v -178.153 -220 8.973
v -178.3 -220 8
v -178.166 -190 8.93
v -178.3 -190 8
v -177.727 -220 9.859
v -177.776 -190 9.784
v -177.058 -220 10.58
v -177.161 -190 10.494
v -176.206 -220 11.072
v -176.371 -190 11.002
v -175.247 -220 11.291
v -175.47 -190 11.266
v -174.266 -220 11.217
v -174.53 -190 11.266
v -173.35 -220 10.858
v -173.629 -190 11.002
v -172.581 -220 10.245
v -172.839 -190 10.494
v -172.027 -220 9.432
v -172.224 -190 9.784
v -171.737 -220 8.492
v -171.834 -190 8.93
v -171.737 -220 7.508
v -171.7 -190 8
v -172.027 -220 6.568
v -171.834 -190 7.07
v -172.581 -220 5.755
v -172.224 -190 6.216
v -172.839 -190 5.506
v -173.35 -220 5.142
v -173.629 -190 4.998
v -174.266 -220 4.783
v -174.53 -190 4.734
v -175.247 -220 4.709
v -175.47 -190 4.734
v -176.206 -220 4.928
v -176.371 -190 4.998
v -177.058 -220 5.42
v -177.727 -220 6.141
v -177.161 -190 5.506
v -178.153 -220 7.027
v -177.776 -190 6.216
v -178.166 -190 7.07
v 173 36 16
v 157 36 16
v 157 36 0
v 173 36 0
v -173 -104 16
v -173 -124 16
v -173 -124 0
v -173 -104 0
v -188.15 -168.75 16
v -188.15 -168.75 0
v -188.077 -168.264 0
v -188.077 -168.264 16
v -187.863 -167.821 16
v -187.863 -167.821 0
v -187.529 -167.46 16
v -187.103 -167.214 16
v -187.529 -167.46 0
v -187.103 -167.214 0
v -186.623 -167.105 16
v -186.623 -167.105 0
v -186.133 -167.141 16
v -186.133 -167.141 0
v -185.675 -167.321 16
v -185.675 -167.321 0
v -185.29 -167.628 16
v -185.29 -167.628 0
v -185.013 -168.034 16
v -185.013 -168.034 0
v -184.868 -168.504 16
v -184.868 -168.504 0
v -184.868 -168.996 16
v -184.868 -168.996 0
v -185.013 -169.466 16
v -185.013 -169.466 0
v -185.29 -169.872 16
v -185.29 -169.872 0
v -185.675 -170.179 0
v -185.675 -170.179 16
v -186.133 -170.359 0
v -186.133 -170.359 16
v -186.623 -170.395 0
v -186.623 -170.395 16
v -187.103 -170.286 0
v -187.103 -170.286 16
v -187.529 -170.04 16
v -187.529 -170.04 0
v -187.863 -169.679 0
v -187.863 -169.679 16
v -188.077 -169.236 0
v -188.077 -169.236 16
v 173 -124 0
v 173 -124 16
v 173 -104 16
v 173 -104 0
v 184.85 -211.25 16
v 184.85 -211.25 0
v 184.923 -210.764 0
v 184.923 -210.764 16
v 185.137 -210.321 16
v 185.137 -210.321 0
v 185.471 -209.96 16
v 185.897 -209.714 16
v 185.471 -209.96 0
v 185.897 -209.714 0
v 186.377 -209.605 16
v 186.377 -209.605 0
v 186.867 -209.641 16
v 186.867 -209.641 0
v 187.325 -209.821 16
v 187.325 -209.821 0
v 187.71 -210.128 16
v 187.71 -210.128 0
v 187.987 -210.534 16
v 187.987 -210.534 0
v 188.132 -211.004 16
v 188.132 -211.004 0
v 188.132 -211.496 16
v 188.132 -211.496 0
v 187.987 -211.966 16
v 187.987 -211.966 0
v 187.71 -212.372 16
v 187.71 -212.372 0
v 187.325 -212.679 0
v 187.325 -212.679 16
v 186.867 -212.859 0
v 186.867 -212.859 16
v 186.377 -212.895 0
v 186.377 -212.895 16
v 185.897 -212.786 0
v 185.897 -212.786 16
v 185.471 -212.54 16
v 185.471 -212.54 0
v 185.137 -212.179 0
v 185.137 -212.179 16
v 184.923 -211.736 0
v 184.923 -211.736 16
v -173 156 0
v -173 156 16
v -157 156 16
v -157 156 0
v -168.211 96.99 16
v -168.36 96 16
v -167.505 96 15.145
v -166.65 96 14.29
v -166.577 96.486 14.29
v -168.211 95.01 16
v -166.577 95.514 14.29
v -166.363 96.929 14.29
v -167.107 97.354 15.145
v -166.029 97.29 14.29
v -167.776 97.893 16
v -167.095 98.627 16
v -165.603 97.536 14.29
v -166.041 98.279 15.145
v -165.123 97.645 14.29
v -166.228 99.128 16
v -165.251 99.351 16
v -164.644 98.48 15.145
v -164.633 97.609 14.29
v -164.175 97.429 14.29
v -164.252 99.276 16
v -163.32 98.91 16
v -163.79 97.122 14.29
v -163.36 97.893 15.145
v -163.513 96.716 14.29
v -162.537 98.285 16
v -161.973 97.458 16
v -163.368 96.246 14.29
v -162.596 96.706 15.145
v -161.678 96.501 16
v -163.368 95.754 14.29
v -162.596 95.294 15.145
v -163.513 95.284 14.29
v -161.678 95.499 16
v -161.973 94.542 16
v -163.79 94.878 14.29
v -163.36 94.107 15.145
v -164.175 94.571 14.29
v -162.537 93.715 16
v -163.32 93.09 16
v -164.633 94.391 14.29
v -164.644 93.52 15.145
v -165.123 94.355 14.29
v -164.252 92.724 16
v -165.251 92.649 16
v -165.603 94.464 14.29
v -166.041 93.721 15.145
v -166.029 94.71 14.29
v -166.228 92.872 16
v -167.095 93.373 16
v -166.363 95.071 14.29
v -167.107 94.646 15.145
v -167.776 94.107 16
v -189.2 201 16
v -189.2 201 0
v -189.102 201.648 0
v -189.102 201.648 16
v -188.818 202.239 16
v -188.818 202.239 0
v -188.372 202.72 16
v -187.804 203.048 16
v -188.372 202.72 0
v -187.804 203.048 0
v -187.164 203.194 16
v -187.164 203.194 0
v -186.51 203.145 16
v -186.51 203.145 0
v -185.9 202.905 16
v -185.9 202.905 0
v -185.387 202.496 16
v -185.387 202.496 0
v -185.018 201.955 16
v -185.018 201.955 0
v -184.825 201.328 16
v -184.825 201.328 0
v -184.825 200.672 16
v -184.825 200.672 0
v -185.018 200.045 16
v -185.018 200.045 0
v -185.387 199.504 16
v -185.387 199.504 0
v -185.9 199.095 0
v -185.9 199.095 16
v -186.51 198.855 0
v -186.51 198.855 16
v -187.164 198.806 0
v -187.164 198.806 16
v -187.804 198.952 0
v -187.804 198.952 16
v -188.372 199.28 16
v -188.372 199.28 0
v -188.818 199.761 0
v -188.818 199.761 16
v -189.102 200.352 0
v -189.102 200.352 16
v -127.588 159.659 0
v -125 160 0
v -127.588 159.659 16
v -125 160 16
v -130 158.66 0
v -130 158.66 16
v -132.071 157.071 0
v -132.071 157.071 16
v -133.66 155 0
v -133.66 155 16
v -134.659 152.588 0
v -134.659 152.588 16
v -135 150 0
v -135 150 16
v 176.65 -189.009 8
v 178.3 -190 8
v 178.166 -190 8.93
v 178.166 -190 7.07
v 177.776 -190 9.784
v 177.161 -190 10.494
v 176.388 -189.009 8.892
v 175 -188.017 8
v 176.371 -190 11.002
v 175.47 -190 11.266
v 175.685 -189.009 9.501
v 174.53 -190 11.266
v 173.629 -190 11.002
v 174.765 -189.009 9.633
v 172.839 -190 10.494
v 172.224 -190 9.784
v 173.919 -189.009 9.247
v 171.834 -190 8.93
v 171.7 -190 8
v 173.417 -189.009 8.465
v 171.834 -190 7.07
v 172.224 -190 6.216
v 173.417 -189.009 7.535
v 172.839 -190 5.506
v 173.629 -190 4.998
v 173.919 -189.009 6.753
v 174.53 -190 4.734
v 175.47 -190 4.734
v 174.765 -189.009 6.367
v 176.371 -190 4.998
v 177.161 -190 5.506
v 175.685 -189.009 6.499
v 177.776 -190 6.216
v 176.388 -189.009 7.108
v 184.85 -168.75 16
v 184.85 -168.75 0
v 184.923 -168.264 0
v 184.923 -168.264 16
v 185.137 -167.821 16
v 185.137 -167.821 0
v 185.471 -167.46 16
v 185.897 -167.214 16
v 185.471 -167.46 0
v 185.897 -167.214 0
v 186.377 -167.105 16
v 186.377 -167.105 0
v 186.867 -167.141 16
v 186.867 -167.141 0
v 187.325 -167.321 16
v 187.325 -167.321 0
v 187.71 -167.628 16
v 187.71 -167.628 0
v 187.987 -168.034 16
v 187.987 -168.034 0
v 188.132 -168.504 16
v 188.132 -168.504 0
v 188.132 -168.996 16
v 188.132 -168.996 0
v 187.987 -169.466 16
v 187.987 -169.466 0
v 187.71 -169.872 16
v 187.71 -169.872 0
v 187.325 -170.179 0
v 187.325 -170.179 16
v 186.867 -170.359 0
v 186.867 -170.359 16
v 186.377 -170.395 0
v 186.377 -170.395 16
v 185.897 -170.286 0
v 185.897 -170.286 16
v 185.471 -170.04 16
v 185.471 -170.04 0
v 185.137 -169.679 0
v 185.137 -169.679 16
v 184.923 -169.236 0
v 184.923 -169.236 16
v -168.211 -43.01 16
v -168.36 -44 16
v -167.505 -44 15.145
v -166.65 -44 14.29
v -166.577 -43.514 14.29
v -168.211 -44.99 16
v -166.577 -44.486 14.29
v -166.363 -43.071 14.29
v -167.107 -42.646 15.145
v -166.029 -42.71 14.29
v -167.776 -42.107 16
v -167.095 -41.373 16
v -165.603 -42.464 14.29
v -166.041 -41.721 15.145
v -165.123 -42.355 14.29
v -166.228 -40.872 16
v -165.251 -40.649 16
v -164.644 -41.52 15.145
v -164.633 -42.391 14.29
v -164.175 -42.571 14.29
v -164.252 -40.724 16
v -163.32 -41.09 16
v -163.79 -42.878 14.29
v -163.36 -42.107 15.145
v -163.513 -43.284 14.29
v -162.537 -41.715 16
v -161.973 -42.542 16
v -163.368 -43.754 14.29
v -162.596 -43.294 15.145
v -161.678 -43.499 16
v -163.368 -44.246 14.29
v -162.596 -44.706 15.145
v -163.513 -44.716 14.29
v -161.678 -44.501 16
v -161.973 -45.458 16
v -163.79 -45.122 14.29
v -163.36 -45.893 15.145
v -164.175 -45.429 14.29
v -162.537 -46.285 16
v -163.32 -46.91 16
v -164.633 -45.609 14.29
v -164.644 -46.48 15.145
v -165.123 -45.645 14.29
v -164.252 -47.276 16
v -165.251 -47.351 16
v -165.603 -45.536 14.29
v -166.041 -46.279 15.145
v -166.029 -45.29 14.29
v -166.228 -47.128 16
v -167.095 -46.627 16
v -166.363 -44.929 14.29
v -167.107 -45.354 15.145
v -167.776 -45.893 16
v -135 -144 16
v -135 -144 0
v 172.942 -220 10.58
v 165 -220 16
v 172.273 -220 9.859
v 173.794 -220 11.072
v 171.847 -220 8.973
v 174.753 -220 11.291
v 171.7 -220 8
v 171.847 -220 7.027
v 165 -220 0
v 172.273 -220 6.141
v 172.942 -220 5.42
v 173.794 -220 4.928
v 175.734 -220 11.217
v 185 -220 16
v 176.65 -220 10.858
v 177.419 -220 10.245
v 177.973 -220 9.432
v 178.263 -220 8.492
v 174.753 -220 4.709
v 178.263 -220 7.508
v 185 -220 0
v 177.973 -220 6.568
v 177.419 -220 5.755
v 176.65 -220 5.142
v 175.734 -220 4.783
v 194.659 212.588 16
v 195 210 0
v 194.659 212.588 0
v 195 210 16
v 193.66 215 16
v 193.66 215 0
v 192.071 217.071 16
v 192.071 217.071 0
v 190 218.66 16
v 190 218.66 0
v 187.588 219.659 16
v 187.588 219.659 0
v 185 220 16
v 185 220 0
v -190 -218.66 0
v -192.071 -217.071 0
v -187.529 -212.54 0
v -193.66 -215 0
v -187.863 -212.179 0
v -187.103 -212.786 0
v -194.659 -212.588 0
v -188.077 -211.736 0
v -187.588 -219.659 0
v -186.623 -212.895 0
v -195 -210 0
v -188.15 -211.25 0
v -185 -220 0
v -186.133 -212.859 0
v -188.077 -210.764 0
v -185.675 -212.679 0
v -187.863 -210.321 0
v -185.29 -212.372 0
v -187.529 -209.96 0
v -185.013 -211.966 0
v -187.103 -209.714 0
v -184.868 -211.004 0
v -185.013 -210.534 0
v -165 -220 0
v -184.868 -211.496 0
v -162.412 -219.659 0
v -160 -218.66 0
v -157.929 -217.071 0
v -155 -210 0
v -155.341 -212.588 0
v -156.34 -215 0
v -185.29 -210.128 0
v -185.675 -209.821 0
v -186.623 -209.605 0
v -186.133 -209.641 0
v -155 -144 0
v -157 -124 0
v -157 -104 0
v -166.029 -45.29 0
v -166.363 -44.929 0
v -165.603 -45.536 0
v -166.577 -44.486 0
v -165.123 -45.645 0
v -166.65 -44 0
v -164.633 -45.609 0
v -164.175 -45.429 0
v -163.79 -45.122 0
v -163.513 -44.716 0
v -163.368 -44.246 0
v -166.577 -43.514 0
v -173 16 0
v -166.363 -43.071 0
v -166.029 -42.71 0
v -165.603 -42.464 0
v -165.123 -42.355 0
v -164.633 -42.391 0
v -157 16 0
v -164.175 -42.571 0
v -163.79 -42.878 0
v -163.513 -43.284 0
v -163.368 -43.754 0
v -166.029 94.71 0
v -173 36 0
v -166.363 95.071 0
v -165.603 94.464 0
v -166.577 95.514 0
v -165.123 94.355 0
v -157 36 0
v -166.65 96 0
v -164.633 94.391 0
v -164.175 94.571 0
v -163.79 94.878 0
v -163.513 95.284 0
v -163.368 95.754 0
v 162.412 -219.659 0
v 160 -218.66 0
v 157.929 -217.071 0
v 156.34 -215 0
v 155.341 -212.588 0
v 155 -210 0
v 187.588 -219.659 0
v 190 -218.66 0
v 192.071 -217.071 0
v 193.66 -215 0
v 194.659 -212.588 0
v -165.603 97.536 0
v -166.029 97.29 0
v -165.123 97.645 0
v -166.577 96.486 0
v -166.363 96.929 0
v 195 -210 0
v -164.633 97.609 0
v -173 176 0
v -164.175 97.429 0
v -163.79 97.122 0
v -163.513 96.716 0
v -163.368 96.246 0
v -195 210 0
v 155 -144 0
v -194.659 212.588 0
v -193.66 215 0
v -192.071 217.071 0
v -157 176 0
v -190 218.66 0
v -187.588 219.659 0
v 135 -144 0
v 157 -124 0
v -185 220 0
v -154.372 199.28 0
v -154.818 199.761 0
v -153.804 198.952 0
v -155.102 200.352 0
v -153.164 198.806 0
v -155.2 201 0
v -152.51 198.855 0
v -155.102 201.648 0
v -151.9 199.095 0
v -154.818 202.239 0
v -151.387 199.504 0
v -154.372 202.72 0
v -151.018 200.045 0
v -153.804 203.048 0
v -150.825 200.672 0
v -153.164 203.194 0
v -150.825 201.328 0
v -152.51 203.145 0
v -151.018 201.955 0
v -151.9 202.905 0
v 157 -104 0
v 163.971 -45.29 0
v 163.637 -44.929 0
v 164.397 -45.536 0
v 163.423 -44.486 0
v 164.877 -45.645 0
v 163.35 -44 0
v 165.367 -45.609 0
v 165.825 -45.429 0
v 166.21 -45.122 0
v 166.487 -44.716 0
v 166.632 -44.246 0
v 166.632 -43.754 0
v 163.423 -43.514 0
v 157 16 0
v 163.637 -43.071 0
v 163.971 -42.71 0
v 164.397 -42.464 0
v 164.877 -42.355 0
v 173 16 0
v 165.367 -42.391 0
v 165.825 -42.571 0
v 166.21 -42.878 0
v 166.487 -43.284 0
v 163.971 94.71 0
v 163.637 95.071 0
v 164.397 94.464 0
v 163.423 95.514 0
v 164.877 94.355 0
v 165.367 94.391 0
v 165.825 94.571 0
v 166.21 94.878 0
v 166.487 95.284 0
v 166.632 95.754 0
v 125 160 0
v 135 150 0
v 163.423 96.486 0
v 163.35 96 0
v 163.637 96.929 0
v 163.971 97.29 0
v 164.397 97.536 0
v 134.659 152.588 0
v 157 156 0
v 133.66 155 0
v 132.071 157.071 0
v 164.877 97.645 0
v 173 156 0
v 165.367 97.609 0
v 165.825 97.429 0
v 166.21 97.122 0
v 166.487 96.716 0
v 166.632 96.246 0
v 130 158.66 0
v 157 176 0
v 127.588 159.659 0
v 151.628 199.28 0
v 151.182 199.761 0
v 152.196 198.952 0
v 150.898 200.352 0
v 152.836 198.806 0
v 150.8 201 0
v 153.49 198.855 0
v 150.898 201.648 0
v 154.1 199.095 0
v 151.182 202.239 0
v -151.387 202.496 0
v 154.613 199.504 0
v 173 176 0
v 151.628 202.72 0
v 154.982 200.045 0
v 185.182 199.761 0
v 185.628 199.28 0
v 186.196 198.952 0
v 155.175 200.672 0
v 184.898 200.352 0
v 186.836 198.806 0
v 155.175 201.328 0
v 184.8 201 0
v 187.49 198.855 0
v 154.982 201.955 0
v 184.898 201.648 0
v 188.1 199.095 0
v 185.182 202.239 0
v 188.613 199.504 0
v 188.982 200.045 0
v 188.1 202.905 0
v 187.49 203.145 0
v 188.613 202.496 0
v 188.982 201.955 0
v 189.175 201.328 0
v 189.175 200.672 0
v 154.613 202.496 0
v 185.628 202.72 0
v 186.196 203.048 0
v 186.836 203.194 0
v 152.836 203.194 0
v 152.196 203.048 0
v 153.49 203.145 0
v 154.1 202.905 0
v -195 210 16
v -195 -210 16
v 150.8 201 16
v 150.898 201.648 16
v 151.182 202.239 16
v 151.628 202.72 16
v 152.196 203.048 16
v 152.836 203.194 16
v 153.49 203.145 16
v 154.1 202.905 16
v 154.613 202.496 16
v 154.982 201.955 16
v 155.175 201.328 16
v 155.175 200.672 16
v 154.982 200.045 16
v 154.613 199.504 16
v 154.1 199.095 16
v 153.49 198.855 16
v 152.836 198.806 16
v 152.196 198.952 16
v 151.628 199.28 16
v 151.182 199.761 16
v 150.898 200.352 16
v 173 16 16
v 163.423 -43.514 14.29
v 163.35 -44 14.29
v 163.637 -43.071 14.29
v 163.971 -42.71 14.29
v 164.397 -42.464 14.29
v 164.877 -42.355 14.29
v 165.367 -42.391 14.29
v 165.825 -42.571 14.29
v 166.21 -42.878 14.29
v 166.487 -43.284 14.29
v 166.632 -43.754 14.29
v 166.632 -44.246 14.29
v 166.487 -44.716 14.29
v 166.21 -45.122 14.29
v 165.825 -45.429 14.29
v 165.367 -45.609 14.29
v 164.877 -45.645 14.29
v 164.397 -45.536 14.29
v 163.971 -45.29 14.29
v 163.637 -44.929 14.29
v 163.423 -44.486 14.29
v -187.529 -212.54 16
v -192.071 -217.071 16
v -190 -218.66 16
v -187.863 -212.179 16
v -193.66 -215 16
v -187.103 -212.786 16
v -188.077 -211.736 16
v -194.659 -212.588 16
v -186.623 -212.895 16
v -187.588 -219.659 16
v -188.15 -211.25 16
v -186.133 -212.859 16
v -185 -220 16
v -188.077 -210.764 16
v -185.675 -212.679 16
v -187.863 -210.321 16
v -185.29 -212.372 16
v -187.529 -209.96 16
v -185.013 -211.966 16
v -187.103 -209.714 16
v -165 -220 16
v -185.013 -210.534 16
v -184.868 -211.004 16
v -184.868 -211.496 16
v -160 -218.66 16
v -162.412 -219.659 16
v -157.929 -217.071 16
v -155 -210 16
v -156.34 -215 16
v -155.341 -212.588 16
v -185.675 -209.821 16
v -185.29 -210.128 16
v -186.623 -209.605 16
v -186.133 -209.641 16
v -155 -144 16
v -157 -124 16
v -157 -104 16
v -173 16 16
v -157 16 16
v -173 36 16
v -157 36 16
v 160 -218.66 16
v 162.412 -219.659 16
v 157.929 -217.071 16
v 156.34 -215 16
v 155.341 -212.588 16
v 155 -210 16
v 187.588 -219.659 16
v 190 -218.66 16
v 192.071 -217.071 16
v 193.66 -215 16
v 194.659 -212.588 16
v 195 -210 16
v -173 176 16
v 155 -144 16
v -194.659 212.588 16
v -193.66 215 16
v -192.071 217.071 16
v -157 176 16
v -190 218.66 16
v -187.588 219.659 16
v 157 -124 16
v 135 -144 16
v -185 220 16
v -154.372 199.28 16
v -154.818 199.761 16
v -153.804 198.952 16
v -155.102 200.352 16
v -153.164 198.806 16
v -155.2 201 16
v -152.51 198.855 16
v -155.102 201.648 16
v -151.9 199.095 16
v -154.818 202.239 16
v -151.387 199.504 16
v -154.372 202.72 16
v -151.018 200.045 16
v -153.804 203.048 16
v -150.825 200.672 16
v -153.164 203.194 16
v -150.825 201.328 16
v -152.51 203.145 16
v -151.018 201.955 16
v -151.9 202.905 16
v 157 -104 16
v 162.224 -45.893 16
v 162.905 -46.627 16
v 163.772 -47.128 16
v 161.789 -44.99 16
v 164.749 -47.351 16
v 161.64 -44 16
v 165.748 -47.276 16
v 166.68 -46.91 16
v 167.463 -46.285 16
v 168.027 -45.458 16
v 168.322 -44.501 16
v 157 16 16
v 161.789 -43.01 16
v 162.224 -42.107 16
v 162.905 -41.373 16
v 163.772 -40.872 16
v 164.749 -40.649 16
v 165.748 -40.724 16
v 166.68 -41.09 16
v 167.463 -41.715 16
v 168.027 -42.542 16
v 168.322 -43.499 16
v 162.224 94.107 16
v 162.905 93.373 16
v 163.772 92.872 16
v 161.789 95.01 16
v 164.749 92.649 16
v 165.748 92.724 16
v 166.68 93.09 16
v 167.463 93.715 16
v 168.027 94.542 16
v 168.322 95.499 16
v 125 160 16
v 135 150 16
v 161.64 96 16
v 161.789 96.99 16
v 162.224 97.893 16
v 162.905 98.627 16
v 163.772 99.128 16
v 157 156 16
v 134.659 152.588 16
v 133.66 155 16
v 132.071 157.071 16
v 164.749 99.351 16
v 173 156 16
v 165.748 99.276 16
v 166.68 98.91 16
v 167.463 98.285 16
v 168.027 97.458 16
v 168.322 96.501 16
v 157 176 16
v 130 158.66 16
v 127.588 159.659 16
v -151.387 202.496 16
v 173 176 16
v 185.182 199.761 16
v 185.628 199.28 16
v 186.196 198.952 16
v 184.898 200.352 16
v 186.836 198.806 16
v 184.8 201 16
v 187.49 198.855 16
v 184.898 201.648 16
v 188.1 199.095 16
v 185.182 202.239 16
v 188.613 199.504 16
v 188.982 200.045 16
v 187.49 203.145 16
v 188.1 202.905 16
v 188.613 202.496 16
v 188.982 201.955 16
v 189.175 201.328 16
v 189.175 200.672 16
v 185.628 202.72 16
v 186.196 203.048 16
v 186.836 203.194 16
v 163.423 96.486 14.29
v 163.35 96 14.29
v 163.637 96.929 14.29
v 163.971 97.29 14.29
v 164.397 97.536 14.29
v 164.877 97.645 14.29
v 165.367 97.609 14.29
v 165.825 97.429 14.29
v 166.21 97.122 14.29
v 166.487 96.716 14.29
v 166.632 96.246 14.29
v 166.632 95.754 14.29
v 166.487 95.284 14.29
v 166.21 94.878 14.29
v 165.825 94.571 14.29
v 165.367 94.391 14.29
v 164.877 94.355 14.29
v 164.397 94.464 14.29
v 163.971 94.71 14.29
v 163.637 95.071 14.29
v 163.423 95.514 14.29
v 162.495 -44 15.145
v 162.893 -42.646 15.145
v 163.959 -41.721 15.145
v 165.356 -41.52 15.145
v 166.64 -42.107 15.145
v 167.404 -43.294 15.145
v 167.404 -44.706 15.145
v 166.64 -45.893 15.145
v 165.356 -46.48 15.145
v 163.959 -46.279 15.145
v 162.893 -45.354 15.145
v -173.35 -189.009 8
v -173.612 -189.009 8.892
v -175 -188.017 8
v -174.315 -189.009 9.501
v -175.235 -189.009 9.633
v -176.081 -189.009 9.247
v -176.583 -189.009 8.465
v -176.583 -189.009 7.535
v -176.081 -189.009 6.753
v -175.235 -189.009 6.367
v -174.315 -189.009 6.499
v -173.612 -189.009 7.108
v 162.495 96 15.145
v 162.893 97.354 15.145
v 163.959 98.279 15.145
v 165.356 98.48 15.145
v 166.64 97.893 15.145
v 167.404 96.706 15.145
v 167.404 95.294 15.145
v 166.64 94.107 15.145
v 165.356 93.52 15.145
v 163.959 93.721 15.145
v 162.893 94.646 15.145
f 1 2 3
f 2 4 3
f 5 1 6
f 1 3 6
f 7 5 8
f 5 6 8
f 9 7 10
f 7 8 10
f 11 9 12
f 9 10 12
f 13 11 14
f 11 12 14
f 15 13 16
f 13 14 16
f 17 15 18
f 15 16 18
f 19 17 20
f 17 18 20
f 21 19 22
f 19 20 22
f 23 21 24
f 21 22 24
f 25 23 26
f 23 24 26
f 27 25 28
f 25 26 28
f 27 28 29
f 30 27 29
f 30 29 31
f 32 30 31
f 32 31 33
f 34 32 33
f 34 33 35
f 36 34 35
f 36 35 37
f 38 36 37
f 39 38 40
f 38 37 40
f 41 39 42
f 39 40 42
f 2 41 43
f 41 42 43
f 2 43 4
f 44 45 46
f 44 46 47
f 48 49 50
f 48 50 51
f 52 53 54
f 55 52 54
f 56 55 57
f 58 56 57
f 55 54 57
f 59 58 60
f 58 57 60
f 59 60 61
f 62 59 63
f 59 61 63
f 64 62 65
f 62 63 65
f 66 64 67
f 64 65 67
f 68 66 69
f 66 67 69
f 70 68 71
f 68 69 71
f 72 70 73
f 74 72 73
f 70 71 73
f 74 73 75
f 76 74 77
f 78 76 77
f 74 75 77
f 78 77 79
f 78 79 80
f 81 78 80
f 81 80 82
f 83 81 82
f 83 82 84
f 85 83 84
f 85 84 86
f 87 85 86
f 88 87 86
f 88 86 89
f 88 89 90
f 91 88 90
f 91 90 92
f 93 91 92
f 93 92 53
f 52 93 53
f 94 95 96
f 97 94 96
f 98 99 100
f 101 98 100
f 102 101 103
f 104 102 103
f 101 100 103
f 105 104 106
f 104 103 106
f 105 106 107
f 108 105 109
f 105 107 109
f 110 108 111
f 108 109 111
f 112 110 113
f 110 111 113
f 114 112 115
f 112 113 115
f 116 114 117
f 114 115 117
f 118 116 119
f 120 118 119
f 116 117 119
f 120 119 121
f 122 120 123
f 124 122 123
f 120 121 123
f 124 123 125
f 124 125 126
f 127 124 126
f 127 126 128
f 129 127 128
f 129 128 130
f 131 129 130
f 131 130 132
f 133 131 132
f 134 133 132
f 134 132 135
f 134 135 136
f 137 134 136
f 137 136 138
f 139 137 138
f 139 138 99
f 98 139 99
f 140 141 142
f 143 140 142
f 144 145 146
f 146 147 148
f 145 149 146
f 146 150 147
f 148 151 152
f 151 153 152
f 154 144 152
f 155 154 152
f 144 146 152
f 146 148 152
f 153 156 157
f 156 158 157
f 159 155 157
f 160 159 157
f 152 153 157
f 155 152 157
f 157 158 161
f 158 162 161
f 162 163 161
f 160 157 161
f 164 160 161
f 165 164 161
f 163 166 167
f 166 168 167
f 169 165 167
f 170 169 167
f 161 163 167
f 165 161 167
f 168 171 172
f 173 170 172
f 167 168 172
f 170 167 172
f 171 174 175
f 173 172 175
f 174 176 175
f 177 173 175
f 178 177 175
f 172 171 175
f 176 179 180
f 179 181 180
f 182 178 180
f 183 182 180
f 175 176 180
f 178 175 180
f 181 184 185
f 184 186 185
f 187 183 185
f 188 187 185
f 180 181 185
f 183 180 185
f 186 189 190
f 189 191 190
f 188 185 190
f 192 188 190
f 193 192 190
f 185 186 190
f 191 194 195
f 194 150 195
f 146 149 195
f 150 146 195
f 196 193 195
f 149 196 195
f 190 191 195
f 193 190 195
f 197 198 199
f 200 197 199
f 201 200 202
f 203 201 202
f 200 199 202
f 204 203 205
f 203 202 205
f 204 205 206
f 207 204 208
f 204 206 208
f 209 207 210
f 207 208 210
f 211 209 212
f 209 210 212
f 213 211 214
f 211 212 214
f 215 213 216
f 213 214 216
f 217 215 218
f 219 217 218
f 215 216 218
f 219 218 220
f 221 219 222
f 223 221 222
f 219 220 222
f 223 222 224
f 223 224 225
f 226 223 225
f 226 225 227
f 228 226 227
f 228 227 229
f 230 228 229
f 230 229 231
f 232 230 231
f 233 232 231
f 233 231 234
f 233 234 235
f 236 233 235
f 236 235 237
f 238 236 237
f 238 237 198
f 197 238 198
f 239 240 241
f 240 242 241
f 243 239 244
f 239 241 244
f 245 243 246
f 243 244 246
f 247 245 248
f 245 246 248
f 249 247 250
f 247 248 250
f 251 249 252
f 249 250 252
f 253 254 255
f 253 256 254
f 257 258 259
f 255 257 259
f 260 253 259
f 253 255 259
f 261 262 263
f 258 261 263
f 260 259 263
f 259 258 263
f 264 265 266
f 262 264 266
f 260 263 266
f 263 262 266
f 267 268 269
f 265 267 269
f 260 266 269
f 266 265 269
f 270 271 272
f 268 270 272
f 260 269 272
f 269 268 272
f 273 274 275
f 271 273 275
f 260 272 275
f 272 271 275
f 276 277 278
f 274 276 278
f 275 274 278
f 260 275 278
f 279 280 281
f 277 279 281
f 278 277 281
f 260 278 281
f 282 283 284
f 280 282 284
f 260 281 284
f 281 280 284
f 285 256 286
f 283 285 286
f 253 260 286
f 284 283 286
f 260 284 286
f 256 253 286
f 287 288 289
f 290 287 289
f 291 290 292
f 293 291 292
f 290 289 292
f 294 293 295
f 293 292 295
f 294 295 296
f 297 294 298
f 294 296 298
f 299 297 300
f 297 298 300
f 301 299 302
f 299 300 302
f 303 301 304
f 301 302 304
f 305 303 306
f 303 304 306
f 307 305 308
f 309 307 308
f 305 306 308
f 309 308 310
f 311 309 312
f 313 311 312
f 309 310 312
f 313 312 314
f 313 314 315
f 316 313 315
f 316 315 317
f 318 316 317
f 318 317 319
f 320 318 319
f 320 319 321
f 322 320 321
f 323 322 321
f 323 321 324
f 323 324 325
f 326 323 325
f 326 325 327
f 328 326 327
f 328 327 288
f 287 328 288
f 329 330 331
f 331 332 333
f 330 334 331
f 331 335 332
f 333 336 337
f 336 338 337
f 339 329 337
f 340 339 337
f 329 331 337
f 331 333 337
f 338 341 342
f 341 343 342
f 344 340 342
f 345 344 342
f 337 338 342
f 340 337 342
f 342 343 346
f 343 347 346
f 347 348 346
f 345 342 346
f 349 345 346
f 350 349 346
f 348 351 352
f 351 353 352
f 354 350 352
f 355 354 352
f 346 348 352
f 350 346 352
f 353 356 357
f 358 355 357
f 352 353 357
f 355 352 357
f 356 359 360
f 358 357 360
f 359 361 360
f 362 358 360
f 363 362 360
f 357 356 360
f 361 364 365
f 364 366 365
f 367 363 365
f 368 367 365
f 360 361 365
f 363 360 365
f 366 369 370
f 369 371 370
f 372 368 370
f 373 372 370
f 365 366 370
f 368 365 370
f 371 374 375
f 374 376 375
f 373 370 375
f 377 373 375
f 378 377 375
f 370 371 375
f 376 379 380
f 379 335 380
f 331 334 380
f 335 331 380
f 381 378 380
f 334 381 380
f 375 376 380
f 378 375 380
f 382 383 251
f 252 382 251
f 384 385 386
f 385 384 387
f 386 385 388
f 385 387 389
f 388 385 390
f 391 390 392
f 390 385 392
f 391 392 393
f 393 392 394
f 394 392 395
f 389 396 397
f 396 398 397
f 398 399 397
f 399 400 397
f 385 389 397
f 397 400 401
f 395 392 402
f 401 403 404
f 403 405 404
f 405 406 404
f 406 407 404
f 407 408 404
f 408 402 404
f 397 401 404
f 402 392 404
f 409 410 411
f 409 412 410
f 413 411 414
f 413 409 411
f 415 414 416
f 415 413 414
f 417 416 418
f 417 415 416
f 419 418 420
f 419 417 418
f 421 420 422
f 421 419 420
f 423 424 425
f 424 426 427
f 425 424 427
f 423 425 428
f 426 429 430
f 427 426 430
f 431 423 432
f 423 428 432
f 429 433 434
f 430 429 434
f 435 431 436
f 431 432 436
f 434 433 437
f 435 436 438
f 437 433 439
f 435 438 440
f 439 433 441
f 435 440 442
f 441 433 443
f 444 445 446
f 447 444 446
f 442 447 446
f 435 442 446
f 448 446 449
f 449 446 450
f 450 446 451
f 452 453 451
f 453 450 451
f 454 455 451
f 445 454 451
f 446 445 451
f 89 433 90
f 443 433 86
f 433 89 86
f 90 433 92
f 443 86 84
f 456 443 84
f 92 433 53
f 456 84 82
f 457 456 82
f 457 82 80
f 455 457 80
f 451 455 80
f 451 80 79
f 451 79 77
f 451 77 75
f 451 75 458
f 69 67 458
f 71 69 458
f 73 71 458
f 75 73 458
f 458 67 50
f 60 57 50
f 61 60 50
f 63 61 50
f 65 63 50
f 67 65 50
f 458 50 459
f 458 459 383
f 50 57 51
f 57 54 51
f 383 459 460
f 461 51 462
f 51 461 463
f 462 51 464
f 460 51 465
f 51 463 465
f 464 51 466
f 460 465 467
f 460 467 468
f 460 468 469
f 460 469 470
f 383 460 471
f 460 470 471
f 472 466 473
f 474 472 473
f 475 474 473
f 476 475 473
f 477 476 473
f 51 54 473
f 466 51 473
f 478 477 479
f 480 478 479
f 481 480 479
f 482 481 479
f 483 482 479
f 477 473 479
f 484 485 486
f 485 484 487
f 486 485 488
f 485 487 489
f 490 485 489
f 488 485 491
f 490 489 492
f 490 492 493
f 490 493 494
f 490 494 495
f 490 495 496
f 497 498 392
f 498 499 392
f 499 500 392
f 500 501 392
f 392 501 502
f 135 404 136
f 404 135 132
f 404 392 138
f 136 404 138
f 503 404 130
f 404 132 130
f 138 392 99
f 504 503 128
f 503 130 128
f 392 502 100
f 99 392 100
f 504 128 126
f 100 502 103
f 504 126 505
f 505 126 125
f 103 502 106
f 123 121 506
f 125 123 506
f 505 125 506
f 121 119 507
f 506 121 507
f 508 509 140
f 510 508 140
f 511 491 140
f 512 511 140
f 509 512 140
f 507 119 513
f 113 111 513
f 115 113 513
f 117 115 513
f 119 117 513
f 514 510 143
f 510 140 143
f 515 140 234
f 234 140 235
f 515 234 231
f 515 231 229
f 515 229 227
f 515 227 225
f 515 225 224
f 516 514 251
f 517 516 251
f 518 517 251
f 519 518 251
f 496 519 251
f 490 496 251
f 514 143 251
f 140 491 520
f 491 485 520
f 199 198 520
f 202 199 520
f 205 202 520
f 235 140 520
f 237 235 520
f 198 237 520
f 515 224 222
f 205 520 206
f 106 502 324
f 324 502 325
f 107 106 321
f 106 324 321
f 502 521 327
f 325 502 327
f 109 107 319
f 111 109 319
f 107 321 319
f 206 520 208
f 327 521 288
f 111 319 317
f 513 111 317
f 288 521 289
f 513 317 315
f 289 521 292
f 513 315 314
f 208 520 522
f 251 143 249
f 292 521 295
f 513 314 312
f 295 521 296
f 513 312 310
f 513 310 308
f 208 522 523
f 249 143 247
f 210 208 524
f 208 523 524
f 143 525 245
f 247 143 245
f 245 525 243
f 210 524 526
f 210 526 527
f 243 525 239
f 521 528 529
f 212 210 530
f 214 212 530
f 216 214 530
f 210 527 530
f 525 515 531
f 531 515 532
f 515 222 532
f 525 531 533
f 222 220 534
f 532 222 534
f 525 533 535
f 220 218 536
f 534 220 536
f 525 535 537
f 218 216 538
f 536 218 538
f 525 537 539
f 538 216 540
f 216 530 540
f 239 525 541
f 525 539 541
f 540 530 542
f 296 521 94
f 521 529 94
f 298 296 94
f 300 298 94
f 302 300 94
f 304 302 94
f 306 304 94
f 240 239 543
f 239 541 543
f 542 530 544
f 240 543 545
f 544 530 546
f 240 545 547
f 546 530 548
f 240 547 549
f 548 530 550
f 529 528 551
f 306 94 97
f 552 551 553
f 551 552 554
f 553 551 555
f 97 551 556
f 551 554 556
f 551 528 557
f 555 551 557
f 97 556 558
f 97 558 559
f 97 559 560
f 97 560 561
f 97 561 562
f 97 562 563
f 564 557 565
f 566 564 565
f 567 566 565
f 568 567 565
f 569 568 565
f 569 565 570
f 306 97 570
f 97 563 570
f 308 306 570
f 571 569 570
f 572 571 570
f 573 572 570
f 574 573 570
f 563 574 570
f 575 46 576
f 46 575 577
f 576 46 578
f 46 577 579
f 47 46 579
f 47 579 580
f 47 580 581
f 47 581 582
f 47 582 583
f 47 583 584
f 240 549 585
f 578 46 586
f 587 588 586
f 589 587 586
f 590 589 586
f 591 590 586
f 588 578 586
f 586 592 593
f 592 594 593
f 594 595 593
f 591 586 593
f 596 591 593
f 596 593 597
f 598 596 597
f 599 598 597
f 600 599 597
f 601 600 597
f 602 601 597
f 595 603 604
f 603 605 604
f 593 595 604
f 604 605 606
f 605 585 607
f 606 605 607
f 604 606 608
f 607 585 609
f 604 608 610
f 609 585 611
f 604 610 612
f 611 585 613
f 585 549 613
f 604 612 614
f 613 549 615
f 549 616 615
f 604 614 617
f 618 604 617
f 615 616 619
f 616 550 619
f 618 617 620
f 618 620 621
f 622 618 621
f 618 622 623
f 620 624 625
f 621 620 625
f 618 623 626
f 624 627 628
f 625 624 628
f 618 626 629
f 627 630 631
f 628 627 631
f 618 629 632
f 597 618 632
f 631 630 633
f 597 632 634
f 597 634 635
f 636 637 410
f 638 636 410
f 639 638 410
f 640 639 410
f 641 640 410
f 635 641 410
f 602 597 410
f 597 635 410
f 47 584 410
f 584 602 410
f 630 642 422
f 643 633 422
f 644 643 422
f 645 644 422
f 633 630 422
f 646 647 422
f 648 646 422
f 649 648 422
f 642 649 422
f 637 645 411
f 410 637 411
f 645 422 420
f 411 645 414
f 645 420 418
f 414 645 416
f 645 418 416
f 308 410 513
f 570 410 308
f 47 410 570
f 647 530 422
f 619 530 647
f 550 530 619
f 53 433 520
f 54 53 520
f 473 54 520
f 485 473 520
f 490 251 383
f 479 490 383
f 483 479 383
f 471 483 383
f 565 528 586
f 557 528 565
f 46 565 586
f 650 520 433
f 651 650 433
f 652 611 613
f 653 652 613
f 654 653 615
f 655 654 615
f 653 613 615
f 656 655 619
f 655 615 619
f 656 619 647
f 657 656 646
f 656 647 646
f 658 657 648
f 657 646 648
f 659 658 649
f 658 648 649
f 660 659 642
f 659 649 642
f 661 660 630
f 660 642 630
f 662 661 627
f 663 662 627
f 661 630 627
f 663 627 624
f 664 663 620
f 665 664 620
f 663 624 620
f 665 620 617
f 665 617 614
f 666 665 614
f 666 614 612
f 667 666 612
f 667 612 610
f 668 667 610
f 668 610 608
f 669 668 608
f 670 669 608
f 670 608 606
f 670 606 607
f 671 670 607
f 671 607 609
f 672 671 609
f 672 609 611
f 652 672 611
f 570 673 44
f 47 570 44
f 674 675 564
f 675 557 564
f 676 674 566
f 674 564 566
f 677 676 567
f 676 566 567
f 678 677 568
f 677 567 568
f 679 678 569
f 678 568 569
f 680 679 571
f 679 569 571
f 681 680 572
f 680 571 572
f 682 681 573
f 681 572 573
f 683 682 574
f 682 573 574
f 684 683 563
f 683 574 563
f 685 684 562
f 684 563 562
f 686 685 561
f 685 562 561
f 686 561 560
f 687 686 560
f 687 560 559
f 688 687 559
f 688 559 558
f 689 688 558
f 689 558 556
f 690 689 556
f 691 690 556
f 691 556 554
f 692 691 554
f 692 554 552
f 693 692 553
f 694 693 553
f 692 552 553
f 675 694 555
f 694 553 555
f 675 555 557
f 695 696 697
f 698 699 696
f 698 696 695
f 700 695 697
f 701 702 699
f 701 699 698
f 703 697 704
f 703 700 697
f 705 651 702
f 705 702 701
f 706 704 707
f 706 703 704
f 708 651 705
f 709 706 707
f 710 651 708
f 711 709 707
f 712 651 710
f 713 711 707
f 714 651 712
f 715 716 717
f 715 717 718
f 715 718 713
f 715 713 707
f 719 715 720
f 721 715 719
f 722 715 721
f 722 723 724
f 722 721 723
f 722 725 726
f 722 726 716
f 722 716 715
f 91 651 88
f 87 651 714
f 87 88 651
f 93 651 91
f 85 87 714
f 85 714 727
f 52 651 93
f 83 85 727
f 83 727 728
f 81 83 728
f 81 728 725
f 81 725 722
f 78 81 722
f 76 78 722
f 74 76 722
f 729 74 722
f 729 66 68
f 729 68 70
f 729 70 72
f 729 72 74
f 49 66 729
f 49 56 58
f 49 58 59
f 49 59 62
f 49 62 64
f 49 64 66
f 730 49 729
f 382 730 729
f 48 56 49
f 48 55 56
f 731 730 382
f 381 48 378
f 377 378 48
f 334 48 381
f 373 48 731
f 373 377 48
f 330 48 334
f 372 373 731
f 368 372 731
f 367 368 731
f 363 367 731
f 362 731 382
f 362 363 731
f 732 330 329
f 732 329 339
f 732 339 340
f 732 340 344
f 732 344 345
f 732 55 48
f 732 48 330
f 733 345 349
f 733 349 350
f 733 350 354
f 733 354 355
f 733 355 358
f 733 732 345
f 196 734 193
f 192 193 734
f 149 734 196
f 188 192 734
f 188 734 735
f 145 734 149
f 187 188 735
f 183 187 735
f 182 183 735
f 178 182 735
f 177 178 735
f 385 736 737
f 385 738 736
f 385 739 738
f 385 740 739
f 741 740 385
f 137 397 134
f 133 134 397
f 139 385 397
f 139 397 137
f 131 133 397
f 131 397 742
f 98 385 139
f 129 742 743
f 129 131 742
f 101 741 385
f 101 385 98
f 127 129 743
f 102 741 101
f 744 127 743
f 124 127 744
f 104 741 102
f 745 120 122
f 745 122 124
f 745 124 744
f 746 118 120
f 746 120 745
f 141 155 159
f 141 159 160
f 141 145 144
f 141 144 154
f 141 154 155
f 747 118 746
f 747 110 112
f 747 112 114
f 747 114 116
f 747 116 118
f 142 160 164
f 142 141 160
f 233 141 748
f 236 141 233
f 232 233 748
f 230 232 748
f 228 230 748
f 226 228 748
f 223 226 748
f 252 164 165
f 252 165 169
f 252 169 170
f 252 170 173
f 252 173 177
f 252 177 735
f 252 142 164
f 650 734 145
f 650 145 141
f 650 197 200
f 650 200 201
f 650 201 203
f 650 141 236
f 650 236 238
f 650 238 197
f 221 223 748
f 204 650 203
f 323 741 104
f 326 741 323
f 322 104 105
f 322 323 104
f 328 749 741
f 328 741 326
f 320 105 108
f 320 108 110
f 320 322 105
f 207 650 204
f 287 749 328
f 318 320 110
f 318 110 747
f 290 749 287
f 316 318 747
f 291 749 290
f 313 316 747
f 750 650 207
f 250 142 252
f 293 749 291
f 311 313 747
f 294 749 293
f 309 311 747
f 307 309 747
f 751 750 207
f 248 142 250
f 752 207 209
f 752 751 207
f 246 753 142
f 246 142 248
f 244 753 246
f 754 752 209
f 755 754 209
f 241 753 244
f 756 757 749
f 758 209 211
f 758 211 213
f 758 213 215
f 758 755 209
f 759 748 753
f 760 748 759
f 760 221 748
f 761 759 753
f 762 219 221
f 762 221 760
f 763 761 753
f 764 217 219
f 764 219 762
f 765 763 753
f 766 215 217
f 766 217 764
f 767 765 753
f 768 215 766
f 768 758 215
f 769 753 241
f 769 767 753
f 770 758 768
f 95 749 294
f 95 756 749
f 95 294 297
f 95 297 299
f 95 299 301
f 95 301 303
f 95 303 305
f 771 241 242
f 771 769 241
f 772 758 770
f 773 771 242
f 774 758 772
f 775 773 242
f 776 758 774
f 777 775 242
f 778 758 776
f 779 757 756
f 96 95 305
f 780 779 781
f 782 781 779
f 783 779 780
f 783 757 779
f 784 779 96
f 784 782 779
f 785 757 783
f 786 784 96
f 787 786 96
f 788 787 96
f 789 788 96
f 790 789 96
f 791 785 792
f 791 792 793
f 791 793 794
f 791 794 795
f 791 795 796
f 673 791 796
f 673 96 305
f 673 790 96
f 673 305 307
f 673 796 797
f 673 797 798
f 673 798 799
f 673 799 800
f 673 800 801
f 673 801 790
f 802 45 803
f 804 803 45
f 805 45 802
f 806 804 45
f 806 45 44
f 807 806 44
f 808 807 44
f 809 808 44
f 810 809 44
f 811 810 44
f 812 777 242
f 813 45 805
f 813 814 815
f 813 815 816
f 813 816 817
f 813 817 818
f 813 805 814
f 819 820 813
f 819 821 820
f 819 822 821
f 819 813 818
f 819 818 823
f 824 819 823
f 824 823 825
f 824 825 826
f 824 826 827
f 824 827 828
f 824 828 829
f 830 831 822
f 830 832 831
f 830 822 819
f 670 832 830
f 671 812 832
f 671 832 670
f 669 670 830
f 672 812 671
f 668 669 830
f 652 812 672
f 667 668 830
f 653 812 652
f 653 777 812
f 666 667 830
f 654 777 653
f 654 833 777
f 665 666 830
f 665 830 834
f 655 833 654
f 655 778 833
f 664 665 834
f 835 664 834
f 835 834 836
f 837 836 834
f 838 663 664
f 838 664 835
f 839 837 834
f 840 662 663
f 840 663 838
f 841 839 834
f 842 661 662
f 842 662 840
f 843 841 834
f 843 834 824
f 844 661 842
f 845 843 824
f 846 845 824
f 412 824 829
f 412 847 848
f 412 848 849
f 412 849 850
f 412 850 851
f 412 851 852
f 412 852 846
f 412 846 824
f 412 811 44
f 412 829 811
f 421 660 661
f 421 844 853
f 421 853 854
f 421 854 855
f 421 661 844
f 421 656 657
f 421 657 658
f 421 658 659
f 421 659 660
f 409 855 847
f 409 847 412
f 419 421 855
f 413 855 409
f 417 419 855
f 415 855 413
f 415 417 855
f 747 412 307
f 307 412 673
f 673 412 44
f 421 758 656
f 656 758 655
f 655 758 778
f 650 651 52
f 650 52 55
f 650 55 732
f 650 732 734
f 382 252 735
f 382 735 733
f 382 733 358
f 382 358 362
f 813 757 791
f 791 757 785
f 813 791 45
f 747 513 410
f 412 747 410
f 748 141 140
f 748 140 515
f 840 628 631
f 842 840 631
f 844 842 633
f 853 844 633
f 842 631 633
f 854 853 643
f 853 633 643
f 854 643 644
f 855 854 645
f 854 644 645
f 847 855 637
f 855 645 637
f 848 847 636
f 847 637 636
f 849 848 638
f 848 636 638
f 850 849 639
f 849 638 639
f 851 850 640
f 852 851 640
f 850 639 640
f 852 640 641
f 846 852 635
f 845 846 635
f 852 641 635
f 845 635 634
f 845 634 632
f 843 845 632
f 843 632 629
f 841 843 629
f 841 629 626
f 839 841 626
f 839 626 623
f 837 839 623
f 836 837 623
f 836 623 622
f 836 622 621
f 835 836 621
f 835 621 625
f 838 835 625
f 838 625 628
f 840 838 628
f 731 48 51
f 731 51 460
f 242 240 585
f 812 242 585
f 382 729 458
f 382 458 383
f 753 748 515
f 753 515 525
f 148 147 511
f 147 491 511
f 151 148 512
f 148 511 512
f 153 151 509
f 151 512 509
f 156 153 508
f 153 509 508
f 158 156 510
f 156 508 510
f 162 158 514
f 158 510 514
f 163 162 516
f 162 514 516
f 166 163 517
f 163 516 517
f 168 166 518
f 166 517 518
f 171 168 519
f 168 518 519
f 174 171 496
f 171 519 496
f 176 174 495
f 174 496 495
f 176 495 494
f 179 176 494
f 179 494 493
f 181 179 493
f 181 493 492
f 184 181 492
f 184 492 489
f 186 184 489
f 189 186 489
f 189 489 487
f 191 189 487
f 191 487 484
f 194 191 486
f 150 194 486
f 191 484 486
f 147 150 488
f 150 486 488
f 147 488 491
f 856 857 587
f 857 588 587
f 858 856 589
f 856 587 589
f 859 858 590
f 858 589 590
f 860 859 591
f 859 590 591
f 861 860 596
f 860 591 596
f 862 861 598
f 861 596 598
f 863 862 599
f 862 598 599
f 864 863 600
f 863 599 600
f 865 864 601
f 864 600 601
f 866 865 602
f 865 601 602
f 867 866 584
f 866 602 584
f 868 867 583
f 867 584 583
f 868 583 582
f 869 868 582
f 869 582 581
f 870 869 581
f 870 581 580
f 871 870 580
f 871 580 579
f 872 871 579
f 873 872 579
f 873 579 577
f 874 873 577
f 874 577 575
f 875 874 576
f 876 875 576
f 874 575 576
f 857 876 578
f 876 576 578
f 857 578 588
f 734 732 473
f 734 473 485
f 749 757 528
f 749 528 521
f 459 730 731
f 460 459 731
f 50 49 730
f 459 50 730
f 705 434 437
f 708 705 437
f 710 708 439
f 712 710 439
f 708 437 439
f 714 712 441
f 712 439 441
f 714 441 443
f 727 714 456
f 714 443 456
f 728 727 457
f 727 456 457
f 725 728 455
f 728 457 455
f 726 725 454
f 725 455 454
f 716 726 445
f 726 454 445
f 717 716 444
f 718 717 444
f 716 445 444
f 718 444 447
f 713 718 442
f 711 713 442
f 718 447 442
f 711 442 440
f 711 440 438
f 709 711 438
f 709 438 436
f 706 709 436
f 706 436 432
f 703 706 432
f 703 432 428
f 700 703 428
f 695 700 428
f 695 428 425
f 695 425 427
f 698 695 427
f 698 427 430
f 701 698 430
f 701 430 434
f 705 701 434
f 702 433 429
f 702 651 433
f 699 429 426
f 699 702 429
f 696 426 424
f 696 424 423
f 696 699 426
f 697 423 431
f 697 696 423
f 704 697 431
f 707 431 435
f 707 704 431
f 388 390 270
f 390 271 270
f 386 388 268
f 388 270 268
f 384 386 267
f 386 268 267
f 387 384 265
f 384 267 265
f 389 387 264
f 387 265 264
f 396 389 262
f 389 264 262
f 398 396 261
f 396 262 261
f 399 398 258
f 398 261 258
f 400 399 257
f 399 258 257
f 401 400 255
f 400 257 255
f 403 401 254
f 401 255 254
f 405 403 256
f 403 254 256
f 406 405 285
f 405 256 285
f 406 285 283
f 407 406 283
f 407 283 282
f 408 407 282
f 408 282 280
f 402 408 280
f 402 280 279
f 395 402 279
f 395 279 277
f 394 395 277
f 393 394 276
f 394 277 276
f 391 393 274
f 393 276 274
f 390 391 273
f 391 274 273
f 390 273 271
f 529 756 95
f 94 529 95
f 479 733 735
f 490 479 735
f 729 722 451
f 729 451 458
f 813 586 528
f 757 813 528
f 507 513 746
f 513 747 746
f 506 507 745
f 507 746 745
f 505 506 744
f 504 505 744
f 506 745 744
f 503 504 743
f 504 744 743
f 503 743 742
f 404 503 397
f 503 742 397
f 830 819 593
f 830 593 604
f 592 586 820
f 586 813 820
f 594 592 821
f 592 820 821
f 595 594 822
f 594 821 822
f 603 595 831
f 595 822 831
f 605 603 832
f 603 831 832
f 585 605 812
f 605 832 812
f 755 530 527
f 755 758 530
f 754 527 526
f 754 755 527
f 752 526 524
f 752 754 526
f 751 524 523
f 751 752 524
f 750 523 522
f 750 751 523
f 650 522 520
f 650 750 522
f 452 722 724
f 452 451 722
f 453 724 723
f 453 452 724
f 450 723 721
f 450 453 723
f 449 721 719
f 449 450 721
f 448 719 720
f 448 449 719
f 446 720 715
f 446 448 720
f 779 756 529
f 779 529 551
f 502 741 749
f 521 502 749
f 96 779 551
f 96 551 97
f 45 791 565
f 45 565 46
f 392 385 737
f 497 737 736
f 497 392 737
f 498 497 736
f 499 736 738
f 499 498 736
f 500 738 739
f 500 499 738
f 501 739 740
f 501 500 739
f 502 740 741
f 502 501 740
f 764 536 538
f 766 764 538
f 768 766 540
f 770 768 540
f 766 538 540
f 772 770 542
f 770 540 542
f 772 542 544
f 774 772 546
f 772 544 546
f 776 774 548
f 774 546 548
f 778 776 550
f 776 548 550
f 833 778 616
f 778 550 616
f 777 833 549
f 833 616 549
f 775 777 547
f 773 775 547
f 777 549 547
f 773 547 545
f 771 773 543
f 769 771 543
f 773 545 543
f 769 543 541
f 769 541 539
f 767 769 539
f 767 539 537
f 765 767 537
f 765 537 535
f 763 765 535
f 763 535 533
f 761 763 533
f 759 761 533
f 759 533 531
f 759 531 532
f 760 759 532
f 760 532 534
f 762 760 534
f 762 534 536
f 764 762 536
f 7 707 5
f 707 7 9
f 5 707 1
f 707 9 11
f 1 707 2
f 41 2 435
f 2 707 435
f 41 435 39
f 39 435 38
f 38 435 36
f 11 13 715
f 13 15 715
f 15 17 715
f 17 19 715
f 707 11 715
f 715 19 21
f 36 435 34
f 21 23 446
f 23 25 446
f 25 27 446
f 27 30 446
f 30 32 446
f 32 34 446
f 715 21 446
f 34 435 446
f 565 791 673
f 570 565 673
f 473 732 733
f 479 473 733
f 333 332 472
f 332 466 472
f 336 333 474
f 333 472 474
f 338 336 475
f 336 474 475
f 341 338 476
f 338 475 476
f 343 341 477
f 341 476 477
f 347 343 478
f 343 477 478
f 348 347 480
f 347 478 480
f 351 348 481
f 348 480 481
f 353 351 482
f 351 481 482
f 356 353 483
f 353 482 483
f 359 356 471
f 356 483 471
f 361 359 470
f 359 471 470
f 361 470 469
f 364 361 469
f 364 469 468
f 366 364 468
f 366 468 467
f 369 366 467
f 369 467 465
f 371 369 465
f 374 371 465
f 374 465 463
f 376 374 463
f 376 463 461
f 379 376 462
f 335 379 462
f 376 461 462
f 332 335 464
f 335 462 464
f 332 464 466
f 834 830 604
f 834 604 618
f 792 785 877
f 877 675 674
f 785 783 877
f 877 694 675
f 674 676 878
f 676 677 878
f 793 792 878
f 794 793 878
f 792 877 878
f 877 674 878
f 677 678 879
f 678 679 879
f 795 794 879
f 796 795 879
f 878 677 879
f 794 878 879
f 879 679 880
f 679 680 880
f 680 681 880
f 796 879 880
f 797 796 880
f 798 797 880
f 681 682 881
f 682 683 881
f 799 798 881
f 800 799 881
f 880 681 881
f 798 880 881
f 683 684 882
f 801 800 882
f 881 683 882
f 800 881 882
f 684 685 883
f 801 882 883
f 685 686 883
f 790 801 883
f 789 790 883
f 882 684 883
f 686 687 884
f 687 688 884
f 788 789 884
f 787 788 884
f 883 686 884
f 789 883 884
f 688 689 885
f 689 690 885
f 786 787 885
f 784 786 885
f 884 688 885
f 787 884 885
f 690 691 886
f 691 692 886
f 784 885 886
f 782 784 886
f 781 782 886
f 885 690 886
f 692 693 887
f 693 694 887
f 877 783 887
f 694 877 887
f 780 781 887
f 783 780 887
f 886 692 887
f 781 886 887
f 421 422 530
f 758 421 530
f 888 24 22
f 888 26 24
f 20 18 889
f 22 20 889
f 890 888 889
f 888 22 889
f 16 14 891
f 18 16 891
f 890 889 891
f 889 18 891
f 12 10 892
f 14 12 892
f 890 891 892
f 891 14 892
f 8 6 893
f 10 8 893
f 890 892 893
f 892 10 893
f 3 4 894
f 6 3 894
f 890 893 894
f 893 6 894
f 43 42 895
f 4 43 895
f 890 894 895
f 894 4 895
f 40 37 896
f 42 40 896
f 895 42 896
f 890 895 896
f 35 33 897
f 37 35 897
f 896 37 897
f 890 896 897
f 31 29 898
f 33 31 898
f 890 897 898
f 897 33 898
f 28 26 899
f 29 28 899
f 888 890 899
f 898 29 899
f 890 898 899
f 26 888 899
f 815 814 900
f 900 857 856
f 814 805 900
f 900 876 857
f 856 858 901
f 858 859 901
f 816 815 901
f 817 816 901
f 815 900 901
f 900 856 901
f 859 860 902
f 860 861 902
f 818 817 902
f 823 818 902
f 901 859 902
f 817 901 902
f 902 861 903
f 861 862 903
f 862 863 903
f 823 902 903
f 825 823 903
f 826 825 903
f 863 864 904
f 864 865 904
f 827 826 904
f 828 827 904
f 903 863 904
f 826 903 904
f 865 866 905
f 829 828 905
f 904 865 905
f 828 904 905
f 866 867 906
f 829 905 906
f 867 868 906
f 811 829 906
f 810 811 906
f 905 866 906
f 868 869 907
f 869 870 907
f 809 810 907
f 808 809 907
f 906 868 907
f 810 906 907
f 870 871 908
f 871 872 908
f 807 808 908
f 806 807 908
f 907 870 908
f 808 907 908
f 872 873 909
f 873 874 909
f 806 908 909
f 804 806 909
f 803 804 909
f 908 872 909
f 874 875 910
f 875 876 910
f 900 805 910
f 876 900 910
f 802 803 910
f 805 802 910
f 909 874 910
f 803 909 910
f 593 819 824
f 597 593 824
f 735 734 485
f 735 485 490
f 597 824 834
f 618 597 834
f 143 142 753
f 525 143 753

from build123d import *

# Parameters (mm, degrees)
F1_DEPTH       = 16
F2_W           = 20
F2_H           = 76
F2_W_2         = 16
F2_H_2         = 20
F3_DEPTH       = 16
F4_R           = 10
F6_D           = 3.3
F6_CSINK_D     = 6.72
F6_CSINK_ANGLE = 90
F8_D           = 6.6
F8_DEPTH       = 30
F8_TIP         = 1.9828400428
F10_D          = 4.4
F12_D          = 3.3


with BuildPart() as f1:
    # F0 (on Top) → F1 (new body)
    with BuildSketch(Plane.XY):
        Polygon((195, -220), (195, 220), (-195, 220), (-195, -220), (-135, -220), (-135, 160), (135, 160), (135, -220), align=None)
    extrude(amount=F1_DEPTH)

    # F2 (on face) → F3 (cut, through all)
    with BuildSketch(Plane.XY.offset(16)):
        with Locations((-145, -182)):
            Rectangle(F2_W, F2_H)
        with Locations((-165, 166)):
            Rectangle(F2_W_2, F2_H_2)
        with Locations((-165, -114)):
            Rectangle(F2_W_2, F2_H_2)
        with Locations((-165, 26)):
            Rectangle(F2_W_2, F2_H_2)
        with Locations((145, -182)):
            Rectangle(F2_W, F2_H)
        with Locations((165, 26)):
            Rectangle(F2_W_2, F2_H_2)
        with Locations((165, 166)):
            Rectangle(F2_W_2, F2_H_2)
        with Locations((165, -114)):
            Rectangle(F2_W_2, F2_H_2)
    extrude(amount=-F3_DEPTH, mode=Mode.SUBTRACT)

    # F4
    f4_edges = [f1.edges().sort_by_distance(p)[0] for p in [
        (-135, 160, 8),
        (135, 160, 8),
        (-195, 220, 8),
        (195, 220, 8),
        (195, -220, 8),
        (155, -220, 8),
        (-155, -220, 8),
        (-195, -220, 8),
    ]]
    fillet(f4_edges, radius=F4_R)

    # F6 (through all)
    with Locations(Plane.XY.offset(16)):
        with Locations((-165, 96), (-165, -44), (165, 96), (165, -44)):
            CounterSinkHole(F6_D / 2, F6_CSINK_D / 2, counter_sink_angle=F6_CSINK_ANGLE)

    # F8
    with Locations(Plane.XZ.offset(220)):
        with Locations((-175, 8), (175, 8)):
            Hole(F8_D / 2, depth=F8_DEPTH)
            with Locations((0, 0, -(F8_DEPTH + F8_TIP / 2))):  # 118° drill point
                Cone(0, F8_D / 2, F8_TIP, mode=Mode.SUBTRACT)

    # F10 (through all)
    with Locations(Plane.XY.offset(16)):
        with Locations((-187, 201), (-153, 201), (187, 201), (153, 201)):
            Hole(F10_D / 2)

    # F12 (through all)
    with Locations(Plane.XY.offset(16)):
        with Locations((-186.5, -168.75), (-186.5, -211.25), (186.5, -211.25), (186.5, -168.75)):
            Hole(F12_D / 2)


solid = f1.part
